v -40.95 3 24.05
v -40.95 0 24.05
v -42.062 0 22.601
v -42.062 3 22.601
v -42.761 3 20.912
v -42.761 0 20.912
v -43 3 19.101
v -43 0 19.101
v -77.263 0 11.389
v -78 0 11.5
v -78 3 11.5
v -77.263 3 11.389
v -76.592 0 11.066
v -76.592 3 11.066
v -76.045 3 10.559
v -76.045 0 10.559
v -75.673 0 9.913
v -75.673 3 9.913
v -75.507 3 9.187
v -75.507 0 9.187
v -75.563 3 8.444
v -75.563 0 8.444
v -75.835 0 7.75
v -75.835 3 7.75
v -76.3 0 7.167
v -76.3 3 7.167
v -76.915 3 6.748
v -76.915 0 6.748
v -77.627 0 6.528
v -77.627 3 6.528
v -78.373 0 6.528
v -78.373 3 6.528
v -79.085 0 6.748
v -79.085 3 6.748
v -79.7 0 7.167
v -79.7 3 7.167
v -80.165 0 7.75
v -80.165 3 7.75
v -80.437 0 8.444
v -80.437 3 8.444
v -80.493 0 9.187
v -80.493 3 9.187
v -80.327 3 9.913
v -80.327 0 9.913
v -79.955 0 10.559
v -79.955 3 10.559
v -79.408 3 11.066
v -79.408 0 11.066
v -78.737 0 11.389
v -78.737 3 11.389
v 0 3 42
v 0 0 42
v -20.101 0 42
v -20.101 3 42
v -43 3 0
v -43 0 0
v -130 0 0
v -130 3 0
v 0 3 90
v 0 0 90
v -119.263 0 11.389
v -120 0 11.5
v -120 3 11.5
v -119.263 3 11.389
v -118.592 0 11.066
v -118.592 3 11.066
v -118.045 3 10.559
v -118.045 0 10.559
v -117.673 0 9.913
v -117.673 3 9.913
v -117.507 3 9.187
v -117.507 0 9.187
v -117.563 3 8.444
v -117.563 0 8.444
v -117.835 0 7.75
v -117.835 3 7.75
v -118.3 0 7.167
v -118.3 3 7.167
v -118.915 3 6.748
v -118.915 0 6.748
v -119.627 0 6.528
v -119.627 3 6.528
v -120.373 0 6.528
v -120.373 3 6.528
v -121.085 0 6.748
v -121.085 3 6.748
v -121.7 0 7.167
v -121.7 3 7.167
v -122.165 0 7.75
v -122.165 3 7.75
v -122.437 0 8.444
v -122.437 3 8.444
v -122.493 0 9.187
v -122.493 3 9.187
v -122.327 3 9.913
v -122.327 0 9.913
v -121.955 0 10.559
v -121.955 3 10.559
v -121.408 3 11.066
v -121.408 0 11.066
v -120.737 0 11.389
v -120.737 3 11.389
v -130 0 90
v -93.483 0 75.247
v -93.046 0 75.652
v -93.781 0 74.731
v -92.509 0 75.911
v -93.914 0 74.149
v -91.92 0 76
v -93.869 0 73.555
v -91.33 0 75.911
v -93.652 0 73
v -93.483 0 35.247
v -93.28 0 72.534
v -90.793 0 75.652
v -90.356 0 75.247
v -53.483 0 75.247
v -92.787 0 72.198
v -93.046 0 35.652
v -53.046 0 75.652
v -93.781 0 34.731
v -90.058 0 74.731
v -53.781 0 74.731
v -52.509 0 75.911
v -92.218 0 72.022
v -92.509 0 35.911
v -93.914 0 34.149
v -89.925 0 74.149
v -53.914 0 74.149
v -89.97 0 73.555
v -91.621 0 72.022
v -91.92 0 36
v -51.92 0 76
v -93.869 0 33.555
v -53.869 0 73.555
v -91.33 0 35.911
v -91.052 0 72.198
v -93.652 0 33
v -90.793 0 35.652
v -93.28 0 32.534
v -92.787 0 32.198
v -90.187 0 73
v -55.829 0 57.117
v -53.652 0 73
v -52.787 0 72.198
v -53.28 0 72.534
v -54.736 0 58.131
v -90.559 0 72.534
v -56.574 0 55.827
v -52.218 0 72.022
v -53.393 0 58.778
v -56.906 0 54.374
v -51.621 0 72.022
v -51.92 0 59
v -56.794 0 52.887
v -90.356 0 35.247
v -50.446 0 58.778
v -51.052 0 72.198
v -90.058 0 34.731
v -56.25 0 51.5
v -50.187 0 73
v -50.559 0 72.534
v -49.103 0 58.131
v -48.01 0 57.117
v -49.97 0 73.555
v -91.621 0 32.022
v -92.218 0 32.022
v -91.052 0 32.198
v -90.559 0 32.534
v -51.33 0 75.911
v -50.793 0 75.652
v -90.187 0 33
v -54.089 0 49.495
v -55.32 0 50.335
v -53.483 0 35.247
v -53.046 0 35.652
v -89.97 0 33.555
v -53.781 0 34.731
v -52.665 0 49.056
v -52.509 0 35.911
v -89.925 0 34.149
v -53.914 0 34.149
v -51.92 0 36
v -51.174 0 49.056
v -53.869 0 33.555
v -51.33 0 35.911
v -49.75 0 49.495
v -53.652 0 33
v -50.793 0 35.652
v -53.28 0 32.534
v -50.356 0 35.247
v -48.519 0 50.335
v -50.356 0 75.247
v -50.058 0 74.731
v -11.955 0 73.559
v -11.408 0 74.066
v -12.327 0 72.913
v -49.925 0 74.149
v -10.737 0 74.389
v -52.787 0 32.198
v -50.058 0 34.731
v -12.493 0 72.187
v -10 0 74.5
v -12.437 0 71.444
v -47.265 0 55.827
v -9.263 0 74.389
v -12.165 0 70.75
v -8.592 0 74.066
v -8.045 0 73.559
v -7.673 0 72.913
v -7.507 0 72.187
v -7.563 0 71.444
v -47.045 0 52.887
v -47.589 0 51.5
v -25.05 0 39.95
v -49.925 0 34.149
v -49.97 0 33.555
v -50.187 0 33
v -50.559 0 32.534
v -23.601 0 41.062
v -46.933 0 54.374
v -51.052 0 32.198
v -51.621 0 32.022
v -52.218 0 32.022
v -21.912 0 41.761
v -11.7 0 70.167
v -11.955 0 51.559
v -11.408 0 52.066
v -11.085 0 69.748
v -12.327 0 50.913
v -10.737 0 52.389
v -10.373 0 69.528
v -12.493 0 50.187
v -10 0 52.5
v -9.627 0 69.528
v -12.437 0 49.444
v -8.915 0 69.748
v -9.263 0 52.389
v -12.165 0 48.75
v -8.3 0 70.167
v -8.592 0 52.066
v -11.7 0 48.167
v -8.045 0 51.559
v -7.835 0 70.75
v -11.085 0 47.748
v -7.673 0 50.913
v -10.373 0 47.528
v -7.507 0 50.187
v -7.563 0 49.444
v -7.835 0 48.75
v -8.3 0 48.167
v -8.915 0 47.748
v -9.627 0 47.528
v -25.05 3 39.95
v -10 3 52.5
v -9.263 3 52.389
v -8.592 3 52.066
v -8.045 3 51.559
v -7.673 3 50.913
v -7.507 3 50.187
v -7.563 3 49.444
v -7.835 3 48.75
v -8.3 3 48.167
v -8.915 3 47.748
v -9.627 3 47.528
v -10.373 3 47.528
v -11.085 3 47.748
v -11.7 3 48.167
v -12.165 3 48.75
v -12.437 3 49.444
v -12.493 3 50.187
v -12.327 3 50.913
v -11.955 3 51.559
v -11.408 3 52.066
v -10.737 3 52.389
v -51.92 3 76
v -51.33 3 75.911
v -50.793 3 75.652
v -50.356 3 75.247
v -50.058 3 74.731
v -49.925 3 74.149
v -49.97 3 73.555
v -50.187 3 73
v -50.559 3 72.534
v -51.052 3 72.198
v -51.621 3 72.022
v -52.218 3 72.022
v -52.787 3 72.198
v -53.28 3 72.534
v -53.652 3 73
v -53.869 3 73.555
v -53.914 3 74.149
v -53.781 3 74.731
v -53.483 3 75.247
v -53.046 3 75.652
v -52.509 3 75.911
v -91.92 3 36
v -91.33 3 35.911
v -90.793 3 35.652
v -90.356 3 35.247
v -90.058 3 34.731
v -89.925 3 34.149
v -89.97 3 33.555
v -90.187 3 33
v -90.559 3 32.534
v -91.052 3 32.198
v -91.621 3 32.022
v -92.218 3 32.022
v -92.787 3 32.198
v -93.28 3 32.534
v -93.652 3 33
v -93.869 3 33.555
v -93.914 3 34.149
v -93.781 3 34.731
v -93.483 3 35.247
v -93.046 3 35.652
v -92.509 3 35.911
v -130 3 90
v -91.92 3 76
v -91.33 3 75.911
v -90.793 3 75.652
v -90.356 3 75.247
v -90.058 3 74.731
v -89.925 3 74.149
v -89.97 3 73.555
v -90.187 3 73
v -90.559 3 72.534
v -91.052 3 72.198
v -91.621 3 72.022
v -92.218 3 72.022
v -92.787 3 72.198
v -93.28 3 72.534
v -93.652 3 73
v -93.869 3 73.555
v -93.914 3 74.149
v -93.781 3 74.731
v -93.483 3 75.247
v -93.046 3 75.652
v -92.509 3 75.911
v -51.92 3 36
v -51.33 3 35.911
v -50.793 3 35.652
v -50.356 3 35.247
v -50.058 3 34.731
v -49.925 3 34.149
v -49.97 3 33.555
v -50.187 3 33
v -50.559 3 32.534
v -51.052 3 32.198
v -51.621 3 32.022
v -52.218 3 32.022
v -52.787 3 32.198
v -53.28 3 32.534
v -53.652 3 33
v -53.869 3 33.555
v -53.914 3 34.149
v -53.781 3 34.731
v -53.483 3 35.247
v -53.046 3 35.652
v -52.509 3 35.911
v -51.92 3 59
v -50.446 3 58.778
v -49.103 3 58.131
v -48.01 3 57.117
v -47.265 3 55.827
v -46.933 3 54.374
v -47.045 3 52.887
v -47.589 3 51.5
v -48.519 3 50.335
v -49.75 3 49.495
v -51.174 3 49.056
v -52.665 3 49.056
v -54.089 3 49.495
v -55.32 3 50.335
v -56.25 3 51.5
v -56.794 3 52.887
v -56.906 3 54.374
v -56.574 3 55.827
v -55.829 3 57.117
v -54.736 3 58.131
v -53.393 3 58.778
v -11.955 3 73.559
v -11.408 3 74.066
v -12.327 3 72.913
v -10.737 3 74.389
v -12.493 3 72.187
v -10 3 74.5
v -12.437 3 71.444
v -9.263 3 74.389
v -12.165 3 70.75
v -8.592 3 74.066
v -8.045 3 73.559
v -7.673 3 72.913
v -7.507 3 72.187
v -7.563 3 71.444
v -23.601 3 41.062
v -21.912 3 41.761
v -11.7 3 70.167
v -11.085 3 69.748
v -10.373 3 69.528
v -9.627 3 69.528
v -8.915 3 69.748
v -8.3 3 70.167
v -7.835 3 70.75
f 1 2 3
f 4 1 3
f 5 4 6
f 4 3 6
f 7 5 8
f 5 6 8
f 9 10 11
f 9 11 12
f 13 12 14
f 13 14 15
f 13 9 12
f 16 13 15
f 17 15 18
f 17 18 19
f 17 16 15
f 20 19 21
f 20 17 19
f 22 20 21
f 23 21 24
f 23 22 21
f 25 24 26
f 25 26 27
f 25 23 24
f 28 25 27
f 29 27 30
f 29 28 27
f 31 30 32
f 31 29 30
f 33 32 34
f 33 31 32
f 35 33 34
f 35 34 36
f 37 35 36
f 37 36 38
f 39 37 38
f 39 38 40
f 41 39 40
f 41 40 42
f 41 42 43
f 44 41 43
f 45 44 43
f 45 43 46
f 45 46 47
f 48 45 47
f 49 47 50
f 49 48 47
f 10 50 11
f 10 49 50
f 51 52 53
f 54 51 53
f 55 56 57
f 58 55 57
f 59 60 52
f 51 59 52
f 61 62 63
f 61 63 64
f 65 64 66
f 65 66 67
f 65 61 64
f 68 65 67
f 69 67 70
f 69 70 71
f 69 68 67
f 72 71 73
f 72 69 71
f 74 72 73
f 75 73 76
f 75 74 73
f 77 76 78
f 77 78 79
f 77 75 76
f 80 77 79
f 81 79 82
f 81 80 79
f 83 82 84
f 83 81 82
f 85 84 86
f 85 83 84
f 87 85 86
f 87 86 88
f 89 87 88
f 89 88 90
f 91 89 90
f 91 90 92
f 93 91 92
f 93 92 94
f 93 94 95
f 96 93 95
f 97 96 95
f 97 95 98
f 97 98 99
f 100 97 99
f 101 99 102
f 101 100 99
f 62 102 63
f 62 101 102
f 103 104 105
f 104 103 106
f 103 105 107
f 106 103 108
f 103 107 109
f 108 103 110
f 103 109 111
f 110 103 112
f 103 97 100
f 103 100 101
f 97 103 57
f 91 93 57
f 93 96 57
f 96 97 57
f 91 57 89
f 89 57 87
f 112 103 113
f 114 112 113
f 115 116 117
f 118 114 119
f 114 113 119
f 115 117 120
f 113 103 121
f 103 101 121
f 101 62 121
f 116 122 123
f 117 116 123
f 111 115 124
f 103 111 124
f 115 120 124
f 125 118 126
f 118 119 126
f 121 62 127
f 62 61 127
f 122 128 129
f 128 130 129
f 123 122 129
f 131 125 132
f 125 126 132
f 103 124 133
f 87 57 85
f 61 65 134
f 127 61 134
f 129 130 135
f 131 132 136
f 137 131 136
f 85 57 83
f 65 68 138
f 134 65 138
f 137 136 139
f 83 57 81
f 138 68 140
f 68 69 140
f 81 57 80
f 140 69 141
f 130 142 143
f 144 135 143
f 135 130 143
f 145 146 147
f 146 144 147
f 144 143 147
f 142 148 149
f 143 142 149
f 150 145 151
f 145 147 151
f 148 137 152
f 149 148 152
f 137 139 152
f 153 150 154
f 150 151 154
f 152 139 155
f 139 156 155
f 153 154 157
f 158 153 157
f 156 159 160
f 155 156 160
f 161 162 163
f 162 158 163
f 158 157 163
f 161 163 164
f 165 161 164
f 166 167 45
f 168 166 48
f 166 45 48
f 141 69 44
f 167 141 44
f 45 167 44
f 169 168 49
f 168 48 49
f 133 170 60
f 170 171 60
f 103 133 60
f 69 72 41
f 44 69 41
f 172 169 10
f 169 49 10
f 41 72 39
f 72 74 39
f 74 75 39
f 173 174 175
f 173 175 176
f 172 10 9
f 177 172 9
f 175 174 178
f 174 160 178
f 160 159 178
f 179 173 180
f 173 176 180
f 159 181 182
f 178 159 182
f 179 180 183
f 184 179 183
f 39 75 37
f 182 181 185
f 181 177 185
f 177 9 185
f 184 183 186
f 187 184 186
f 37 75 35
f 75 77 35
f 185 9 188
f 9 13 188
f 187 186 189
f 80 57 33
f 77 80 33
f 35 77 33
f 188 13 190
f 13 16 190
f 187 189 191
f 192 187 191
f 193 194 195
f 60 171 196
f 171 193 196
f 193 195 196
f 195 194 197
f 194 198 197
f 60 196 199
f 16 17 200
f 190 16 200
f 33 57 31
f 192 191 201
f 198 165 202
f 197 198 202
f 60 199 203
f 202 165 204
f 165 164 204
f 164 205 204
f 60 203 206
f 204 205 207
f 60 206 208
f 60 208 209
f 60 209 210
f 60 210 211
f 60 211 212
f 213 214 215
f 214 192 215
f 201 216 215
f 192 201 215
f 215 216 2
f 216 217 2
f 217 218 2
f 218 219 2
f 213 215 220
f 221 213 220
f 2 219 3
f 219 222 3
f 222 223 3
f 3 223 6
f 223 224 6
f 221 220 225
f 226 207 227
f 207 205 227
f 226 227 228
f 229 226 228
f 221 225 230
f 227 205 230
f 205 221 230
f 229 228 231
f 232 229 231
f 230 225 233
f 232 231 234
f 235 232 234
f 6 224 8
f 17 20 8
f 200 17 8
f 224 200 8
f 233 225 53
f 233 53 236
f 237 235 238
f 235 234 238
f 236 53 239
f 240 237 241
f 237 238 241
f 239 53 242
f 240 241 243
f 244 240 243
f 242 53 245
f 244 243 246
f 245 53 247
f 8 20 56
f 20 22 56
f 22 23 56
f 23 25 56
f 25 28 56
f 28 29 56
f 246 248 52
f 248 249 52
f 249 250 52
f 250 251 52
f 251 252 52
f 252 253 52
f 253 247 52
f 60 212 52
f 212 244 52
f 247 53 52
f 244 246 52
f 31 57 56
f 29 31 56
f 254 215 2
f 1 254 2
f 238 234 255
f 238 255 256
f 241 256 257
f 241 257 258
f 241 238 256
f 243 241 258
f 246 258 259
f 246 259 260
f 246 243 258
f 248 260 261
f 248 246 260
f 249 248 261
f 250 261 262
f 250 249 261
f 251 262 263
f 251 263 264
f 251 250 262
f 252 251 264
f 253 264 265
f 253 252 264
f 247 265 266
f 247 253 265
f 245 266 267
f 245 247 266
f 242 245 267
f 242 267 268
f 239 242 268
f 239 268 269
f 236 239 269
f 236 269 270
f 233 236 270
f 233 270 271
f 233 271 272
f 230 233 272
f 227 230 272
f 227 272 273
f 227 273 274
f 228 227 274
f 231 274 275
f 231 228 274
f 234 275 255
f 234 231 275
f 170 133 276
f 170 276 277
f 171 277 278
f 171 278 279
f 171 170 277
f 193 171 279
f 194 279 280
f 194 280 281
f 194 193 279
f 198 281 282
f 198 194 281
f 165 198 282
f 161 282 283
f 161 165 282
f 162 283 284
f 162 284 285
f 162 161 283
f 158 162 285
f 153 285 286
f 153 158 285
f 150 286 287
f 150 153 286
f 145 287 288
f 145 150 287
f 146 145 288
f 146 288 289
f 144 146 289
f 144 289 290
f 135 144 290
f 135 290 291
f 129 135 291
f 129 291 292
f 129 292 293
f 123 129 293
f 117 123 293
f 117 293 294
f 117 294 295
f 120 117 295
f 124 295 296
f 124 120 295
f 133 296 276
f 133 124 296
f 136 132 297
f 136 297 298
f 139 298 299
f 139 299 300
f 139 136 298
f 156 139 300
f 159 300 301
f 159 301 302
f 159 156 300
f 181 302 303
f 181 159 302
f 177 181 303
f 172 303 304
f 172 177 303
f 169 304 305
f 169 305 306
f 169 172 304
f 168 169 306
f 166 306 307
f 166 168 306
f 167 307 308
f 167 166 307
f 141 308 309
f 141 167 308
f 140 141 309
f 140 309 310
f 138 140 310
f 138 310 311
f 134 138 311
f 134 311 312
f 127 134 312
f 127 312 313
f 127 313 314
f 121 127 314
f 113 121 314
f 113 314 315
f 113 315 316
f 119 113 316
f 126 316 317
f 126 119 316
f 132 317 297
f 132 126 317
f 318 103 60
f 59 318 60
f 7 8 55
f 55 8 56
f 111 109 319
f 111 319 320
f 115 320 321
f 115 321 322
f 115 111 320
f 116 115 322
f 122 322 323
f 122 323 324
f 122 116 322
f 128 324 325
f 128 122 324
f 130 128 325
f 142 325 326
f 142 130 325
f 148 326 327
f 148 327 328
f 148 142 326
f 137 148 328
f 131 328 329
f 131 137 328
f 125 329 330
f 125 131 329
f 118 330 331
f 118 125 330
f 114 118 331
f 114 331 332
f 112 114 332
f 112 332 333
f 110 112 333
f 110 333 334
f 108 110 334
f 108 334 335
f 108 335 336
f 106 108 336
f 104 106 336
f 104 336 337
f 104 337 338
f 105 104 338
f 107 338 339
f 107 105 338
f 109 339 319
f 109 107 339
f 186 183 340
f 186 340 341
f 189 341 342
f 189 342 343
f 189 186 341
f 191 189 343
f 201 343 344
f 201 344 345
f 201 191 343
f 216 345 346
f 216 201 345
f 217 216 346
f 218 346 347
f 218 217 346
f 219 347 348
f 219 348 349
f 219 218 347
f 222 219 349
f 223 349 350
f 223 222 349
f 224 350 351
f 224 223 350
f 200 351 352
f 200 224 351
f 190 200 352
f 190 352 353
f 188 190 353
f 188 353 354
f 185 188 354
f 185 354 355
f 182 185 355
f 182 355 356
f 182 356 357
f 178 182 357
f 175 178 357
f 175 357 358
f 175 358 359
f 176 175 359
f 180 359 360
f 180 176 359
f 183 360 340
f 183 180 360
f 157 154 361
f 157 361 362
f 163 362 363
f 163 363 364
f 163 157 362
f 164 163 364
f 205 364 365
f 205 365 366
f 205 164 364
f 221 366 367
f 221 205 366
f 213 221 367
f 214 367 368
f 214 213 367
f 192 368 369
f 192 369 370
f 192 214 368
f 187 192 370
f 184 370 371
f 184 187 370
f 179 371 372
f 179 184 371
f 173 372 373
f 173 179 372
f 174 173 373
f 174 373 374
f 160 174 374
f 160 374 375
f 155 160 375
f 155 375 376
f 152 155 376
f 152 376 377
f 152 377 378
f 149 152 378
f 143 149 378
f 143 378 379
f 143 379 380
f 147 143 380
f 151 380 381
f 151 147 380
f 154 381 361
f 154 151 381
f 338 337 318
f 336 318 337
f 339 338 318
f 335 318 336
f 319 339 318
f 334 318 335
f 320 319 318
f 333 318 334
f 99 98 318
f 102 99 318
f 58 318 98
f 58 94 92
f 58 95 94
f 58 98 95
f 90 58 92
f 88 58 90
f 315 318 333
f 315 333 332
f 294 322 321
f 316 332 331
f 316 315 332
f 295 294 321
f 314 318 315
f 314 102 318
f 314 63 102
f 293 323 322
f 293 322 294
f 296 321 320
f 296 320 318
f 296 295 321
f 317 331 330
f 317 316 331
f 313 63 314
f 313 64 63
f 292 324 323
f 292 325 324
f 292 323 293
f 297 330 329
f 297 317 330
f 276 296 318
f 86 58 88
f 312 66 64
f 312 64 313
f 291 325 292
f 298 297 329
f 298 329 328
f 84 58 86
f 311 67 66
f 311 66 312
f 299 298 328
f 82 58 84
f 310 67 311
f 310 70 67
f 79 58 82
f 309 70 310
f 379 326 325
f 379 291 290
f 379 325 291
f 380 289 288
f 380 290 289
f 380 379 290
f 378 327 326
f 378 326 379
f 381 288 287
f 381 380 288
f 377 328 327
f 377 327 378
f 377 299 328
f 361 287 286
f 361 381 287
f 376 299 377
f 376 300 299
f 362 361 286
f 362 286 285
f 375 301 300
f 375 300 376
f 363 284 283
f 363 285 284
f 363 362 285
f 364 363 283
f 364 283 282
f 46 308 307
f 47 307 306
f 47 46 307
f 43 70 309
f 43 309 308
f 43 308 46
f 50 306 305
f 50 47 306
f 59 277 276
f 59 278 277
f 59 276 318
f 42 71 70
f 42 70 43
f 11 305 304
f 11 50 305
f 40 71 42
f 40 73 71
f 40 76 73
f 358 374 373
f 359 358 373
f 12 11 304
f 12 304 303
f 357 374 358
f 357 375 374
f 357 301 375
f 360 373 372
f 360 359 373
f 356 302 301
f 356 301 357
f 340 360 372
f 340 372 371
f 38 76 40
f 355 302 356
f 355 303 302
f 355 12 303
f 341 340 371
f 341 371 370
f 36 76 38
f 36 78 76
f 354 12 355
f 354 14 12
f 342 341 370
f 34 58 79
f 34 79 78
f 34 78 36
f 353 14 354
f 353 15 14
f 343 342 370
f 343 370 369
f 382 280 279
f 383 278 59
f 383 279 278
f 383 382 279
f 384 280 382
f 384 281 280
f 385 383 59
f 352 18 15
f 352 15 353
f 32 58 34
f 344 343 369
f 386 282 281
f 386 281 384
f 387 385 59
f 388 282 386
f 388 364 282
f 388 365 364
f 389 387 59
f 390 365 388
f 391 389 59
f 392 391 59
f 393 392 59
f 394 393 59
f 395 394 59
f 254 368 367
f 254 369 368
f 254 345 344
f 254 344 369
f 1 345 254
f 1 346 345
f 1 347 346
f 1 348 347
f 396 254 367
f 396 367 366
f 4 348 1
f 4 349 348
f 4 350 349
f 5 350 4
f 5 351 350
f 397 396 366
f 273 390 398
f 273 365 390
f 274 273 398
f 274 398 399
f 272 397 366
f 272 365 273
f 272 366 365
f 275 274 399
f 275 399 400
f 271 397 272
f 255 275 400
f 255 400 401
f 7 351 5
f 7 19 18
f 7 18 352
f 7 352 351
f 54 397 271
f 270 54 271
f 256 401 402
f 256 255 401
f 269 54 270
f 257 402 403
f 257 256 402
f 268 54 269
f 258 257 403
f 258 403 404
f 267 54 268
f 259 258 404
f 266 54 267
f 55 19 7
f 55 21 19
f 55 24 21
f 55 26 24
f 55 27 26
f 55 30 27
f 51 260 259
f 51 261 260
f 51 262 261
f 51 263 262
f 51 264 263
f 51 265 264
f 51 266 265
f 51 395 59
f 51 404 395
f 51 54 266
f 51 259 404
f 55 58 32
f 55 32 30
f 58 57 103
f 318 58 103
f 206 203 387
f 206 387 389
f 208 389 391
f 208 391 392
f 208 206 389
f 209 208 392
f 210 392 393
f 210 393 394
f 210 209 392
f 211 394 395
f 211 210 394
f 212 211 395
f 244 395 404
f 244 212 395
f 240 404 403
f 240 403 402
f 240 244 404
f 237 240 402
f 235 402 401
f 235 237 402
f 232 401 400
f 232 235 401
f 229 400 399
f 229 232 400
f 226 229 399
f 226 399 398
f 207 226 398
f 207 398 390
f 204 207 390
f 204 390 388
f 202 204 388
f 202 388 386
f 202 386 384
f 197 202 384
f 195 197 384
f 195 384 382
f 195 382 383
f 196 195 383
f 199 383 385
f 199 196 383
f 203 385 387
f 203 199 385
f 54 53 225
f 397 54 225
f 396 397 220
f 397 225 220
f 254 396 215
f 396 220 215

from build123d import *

# Parameters (mm, degrees)
SKETCH1_R           = 2.5
BOSS_EXTRUDE1_DEPTH = 3
SKETCH2_R           = 2
SKETCH2_R_2         = 5
CUT_EXTRUDE2_DEPTH  = 3


with BuildPart() as part:
    # Sketch1 → Boss-Extrude1 (new body)
    with BuildSketch(Plane(origin=(0, 0, 0), x_dir=(1, 0, 0), z_dir=(0, 1, 0))):
        with BuildLine():
            Line((0, -42), (-20.100505063, -42))
            ThreePointArc((-20.100505063, -42), (-22.77928909, -41.467156728), (-25.050252532, -39.949747468))
            Line((-25.050252532, -39.949747468), (-40.949747468, -24.050252532))
            ThreePointArc((-40.949747468, -24.050252532), (-42.467156728, -21.77928909), (-43, -19.100505063))
            Line((-43, -19.100505063), (-43, 0))
            Line((-43, 0), (-130, 0))
            Line((-130, 0), (-130, -90))
            Line((-130, -90), (0, -90))
            Line((0, -90), (0, -42))
        make_face()
        with Locations(Location((-78, -9, 0), (0, 0, 270))):
            Circle(SKETCH1_R, mode=Mode.SUBTRACT)
        with Locations(Location((-120, -9, 0), (0, 0, 270))):
            Circle(SKETCH1_R, mode=Mode.SUBTRACT)
        with Locations(Location((-10, -50, 0), (0, 0, 270))):
            Circle(SKETCH1_R, mode=Mode.SUBTRACT)
        with Locations(Location((-10, -72, 0), (0, 0, 270))):
            Circle(SKETCH1_R, mode=Mode.SUBTRACT)
    extrude(amount=BOSS_EXTRUDE1_DEPTH)

    # Sketch2 → Cut-Extrude2 (cut)
    with BuildSketch(Plane(origin=(0, 0, 0), x_dir=(1, 0, 0), z_dir=(0, 1, 0))):
        with Locations(Location((-51.919512874, -74, 0), (0, 0, 270))):
            Circle(SKETCH2_R)
        with Locations(Location((-51.919512874, -54, 0), (0, 0, 270))):
            Circle(SKETCH2_R_2)
        with Locations(Location((-51.919512874, -34, 0), (0, 0, 270))):
            Circle(SKETCH2_R)
        with Locations(Location((-91.919512874, -34, 0), (0, 0, 270))):
            Circle(SKETCH2_R)
        with Locations(Location((-91.919512874, -74, 0), (0, 0, 270))):
            Circle(SKETCH2_R)
    extrude(amount=CUT_EXTRUDE2_DEPTH, mode=Mode.SUBTRACT)


solid = part.part
